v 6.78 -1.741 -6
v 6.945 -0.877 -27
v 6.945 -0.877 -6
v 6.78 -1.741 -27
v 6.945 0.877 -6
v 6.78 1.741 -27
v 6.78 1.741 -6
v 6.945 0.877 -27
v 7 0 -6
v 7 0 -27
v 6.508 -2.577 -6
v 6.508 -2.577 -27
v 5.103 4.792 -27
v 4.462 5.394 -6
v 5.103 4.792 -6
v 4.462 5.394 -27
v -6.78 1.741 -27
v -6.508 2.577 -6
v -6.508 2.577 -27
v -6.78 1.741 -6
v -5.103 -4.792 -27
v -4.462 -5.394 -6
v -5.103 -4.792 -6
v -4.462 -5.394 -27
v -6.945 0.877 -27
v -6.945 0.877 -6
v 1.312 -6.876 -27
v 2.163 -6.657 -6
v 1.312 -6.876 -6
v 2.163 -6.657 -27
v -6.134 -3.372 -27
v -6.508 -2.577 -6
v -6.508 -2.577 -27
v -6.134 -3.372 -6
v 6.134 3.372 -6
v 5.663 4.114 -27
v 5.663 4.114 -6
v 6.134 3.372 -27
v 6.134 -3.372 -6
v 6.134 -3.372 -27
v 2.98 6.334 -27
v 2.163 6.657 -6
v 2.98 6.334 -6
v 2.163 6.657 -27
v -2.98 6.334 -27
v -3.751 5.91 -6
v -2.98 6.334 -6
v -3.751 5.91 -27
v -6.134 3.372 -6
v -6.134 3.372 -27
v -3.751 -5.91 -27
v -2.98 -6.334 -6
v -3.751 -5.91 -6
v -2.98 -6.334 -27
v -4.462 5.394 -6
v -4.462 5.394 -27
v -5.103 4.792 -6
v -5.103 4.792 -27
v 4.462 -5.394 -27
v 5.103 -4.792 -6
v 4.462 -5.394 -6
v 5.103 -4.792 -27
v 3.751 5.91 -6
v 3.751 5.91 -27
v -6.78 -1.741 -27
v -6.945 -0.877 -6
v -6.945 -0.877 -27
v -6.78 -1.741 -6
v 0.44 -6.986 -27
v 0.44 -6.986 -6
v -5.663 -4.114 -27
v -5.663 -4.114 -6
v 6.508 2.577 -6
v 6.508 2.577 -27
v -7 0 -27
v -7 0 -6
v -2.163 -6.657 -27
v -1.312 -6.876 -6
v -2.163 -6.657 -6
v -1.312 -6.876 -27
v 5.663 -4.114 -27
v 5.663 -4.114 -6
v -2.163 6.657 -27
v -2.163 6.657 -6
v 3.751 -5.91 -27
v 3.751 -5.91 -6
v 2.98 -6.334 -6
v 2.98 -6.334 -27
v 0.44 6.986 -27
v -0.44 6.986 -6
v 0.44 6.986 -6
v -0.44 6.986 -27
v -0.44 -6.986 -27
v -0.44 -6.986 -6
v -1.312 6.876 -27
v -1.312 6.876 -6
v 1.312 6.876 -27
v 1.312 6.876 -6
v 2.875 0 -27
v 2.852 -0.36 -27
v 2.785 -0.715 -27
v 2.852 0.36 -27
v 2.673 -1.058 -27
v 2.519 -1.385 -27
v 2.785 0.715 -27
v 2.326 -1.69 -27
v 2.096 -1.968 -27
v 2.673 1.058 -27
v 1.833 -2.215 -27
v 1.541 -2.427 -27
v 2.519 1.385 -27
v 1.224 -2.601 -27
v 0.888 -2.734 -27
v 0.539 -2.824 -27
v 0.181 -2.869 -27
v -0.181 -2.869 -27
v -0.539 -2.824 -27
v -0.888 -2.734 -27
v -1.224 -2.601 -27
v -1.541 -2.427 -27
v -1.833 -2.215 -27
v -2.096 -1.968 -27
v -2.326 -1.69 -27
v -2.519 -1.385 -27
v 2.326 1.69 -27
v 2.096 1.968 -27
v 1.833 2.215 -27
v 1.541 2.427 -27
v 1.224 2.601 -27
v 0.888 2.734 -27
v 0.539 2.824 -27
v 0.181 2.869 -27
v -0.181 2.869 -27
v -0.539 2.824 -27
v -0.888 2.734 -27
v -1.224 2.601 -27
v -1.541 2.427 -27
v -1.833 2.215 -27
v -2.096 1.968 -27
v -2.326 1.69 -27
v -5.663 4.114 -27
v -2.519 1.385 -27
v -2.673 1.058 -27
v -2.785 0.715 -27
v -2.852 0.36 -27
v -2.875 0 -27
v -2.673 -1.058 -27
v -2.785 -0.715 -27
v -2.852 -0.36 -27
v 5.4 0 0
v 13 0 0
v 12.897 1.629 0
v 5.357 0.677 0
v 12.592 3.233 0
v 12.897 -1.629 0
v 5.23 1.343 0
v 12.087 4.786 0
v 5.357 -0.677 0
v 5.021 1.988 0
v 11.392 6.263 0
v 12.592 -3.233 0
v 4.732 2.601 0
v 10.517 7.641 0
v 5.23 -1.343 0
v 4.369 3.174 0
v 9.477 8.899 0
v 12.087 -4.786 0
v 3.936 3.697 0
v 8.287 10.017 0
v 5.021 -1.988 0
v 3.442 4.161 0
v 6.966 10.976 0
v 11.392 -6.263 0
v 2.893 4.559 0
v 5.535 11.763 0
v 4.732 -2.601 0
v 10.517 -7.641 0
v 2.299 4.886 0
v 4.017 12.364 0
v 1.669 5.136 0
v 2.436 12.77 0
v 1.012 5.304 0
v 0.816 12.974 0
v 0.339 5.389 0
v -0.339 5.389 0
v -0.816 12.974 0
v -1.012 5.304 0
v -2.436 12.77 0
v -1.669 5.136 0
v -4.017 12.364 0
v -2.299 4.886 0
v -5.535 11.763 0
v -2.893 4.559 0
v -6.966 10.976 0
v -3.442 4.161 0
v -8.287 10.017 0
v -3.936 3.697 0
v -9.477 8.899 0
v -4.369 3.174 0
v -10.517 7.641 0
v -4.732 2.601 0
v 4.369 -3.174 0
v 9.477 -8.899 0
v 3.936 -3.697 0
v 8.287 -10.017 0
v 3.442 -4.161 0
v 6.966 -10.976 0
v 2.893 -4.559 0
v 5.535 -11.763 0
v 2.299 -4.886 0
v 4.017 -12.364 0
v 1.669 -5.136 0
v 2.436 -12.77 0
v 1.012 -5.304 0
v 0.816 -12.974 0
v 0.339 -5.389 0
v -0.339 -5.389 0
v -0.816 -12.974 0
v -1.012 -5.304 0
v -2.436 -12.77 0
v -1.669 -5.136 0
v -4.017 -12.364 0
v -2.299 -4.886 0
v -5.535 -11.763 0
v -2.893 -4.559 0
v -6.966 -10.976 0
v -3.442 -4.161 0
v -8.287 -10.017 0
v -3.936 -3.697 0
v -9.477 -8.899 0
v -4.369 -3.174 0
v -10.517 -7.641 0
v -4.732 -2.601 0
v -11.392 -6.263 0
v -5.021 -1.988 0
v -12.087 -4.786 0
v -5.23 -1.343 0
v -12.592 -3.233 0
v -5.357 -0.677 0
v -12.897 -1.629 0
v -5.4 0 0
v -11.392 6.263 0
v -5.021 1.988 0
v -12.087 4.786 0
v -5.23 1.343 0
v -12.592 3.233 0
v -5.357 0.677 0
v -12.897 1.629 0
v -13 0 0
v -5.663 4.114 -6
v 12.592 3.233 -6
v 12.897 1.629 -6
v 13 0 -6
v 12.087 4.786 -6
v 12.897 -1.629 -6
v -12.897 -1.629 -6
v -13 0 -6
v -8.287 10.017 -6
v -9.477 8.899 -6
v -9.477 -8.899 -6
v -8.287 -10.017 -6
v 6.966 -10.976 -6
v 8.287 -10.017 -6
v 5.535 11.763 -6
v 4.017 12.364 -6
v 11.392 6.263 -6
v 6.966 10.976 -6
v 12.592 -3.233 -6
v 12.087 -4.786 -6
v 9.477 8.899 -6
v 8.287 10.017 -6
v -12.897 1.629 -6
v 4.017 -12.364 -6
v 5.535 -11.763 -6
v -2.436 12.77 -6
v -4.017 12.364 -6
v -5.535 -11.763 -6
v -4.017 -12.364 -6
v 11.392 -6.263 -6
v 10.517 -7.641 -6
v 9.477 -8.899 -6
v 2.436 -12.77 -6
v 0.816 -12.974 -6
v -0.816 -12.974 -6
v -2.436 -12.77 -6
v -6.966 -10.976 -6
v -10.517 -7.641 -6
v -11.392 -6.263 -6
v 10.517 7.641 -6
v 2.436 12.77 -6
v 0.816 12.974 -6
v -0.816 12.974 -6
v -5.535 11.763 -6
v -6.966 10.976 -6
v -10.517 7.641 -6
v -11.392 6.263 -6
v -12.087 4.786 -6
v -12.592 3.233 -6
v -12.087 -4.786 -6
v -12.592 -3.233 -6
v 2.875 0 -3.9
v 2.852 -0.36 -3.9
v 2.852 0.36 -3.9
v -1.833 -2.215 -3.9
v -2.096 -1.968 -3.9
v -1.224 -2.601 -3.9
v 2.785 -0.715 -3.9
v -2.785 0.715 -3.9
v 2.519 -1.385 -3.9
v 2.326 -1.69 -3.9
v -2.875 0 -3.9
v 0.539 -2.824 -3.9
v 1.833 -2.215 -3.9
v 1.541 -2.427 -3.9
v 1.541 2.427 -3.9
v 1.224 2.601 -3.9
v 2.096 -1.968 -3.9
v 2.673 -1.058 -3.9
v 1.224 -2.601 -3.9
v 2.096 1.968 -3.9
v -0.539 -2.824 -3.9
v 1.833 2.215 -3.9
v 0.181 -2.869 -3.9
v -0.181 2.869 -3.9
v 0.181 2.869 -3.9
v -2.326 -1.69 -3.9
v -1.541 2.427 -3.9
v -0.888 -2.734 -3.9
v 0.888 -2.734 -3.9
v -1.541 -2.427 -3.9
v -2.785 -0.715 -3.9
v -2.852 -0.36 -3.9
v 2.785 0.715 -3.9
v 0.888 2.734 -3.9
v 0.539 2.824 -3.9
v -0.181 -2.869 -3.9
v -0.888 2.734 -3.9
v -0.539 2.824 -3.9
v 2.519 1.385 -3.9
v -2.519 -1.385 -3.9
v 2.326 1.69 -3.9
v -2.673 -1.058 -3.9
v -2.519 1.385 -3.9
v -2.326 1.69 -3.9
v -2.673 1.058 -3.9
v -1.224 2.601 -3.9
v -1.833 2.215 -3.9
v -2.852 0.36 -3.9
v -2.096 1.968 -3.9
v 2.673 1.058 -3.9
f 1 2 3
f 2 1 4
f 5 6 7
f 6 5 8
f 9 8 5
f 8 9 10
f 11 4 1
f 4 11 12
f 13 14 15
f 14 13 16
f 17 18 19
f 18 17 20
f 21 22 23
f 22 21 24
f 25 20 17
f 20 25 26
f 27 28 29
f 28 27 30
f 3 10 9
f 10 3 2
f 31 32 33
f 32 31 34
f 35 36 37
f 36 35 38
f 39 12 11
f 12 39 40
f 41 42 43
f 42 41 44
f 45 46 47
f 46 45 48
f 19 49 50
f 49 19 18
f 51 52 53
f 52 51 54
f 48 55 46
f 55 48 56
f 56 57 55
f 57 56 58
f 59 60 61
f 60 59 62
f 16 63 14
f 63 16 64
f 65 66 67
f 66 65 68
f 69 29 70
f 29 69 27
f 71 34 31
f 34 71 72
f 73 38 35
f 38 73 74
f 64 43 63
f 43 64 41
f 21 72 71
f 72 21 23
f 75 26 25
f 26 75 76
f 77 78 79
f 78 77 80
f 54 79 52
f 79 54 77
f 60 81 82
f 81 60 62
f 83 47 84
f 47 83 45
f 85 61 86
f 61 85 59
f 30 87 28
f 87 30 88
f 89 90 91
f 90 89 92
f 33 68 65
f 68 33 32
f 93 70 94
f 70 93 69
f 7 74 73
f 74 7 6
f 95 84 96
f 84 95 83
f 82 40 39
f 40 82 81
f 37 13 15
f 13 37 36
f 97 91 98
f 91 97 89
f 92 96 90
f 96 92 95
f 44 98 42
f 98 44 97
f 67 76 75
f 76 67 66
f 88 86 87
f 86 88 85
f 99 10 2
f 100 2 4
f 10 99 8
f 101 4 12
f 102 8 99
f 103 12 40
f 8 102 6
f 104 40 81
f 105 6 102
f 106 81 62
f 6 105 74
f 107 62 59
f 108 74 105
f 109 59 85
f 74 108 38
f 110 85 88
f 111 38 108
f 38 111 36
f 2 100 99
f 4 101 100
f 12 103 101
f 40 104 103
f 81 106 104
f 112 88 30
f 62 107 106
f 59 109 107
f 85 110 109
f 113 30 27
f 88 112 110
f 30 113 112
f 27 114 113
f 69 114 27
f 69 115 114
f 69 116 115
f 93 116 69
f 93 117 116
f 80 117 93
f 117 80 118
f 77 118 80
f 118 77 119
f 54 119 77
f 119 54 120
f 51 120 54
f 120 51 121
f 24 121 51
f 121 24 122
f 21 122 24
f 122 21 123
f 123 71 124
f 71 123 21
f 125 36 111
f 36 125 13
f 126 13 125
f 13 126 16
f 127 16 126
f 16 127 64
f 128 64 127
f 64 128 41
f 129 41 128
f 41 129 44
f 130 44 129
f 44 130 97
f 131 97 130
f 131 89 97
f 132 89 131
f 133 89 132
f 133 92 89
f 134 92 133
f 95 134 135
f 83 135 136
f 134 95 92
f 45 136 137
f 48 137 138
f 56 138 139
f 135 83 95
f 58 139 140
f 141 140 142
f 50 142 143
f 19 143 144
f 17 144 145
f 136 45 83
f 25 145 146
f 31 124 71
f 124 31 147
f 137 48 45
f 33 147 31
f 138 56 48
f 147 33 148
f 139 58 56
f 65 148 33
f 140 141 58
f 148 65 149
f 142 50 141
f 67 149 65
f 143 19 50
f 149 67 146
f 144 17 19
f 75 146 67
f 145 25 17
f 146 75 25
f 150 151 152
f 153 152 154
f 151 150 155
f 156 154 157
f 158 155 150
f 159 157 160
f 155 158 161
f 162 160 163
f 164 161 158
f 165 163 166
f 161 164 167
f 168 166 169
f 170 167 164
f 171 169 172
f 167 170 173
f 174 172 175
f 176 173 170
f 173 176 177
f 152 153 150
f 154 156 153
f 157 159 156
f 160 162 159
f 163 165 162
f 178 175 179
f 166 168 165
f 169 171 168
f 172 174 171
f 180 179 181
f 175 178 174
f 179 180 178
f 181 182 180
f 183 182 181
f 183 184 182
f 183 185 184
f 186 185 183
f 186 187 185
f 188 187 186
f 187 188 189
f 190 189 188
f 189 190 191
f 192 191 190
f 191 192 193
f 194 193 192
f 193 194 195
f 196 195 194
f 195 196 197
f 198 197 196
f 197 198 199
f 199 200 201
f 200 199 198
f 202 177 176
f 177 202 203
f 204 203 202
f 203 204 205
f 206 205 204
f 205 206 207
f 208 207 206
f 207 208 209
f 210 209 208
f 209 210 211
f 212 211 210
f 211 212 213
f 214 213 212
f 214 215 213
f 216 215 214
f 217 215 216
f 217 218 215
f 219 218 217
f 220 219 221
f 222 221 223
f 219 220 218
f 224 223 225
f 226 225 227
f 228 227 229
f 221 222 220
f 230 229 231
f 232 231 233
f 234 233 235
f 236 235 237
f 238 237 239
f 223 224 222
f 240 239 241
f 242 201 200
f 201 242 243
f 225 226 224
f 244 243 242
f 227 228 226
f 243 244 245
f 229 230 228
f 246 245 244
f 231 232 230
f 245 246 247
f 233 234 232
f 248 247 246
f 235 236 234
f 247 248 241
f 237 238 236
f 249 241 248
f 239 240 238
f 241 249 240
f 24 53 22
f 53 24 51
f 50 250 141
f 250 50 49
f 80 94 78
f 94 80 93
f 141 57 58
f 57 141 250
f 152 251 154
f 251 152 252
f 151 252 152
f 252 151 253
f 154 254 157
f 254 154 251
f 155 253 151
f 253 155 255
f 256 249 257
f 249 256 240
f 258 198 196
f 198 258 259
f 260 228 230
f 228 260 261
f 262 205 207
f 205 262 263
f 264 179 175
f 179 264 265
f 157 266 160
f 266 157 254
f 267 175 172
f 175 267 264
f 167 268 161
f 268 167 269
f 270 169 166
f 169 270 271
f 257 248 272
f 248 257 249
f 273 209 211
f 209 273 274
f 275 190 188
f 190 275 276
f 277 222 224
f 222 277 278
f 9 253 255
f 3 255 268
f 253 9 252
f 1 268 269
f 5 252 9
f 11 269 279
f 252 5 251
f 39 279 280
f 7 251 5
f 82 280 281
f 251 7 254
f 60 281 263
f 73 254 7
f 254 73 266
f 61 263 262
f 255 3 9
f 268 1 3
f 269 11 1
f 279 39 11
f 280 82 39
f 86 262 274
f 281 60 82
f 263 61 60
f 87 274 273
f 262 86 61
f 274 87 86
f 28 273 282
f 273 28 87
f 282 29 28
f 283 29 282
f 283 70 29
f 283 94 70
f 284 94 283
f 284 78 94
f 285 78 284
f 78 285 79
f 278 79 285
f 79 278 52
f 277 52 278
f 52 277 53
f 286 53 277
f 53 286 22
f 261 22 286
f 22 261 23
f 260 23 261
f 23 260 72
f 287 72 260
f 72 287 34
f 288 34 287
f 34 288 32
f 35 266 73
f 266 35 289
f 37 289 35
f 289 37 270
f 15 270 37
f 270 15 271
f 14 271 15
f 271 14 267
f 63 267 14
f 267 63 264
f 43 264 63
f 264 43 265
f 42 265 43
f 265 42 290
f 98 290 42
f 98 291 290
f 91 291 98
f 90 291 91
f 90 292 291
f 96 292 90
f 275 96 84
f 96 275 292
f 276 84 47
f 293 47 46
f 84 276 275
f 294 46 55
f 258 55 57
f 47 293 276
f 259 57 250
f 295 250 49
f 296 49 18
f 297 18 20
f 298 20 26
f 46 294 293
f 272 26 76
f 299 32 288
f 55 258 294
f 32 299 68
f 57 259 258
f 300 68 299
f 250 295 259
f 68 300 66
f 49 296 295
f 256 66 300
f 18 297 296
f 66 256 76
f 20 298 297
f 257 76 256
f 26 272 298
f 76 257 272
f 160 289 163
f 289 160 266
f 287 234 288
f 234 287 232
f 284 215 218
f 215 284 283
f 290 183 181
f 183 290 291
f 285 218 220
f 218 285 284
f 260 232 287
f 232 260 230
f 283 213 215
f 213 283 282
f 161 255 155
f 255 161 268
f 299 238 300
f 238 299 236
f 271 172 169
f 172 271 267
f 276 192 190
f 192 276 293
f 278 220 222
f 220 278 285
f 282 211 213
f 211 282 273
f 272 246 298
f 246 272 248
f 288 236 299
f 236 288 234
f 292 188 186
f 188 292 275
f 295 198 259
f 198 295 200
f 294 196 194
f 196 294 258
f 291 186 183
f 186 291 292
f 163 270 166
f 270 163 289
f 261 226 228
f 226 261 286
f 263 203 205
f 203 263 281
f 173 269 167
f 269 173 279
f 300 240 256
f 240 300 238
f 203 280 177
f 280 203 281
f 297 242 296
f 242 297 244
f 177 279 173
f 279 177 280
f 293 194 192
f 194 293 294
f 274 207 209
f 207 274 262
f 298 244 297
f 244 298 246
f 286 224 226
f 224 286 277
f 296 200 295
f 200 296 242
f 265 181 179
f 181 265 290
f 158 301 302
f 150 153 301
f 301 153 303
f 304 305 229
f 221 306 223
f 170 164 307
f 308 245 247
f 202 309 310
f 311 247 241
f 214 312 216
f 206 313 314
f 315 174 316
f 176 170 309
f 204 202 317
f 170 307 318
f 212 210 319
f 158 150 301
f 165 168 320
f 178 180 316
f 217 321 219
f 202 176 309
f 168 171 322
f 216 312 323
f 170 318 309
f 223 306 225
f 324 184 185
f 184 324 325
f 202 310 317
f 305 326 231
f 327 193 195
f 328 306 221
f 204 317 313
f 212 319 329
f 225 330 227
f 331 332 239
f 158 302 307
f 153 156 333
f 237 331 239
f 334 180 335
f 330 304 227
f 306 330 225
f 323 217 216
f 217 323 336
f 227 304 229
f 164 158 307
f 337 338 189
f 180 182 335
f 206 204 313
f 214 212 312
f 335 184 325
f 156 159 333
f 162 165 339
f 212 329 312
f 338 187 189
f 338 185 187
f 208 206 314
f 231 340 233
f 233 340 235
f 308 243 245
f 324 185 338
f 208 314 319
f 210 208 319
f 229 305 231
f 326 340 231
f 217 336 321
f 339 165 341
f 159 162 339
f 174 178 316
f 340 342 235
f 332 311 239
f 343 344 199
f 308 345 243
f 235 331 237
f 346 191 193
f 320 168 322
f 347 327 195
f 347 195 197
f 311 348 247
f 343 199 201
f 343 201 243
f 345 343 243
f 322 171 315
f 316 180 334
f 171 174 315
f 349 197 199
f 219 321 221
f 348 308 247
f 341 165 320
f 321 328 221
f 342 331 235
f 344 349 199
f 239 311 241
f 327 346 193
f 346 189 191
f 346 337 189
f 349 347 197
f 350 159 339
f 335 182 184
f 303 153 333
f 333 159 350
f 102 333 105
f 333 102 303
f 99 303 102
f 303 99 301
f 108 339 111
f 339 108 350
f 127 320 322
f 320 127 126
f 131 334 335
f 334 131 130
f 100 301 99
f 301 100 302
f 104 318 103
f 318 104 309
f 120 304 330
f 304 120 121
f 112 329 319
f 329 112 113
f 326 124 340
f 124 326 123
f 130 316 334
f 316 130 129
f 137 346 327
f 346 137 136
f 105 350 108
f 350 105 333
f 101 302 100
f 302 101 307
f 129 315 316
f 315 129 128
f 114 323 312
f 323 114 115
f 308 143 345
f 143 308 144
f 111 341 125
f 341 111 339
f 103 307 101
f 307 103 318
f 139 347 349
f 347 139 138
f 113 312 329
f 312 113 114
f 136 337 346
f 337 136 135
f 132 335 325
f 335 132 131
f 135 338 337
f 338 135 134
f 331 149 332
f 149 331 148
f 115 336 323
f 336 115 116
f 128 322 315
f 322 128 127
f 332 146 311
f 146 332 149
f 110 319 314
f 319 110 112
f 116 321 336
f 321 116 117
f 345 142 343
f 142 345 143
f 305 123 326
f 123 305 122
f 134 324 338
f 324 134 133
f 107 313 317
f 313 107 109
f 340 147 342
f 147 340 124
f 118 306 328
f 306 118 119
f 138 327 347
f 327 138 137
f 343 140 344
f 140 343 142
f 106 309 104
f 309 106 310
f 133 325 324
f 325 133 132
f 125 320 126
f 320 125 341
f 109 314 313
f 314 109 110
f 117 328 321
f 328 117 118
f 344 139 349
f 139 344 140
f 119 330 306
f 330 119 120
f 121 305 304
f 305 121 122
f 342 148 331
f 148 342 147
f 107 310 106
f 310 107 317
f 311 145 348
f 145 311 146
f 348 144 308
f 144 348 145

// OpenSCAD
$fn = 50;


difference() {
	union() {
		translate(v = [0, 0, -27.0000000000]) {
			cylinder(h = 27, r = 7.0000000000);
		}
		translate(v = [0, 0, -6.0000000000]) {
			cylinder(h = 6, r = 13.0000000000);
		}
	}
	union() {
		translate(v = [0, 0, 0]) {
			rotate(a = [0, 0, 0]) {
				difference() {
					union() {
						#translate(v = [0, 0, -27.0000000000]) {
							cylinder(h = 27, r = 2.6000000000);
						}
						#translate(v = [0, 0, -3.9000000000]) {
							cylinder(h = 3.9000000000, r1 = 2.8750000000, r2 = 5.4000000000);
						}
						#translate(v = [0, 0, -27.0000000000]) {
							cylinder(h = 27, r = 2.8750000000);
						}
						#translate(v = [0, 0, -27.0000000000]) {
							cylinder(h = 27, r = 2.6000000000);
						}
					}
					union();
				}
			}
		}
	}
}
